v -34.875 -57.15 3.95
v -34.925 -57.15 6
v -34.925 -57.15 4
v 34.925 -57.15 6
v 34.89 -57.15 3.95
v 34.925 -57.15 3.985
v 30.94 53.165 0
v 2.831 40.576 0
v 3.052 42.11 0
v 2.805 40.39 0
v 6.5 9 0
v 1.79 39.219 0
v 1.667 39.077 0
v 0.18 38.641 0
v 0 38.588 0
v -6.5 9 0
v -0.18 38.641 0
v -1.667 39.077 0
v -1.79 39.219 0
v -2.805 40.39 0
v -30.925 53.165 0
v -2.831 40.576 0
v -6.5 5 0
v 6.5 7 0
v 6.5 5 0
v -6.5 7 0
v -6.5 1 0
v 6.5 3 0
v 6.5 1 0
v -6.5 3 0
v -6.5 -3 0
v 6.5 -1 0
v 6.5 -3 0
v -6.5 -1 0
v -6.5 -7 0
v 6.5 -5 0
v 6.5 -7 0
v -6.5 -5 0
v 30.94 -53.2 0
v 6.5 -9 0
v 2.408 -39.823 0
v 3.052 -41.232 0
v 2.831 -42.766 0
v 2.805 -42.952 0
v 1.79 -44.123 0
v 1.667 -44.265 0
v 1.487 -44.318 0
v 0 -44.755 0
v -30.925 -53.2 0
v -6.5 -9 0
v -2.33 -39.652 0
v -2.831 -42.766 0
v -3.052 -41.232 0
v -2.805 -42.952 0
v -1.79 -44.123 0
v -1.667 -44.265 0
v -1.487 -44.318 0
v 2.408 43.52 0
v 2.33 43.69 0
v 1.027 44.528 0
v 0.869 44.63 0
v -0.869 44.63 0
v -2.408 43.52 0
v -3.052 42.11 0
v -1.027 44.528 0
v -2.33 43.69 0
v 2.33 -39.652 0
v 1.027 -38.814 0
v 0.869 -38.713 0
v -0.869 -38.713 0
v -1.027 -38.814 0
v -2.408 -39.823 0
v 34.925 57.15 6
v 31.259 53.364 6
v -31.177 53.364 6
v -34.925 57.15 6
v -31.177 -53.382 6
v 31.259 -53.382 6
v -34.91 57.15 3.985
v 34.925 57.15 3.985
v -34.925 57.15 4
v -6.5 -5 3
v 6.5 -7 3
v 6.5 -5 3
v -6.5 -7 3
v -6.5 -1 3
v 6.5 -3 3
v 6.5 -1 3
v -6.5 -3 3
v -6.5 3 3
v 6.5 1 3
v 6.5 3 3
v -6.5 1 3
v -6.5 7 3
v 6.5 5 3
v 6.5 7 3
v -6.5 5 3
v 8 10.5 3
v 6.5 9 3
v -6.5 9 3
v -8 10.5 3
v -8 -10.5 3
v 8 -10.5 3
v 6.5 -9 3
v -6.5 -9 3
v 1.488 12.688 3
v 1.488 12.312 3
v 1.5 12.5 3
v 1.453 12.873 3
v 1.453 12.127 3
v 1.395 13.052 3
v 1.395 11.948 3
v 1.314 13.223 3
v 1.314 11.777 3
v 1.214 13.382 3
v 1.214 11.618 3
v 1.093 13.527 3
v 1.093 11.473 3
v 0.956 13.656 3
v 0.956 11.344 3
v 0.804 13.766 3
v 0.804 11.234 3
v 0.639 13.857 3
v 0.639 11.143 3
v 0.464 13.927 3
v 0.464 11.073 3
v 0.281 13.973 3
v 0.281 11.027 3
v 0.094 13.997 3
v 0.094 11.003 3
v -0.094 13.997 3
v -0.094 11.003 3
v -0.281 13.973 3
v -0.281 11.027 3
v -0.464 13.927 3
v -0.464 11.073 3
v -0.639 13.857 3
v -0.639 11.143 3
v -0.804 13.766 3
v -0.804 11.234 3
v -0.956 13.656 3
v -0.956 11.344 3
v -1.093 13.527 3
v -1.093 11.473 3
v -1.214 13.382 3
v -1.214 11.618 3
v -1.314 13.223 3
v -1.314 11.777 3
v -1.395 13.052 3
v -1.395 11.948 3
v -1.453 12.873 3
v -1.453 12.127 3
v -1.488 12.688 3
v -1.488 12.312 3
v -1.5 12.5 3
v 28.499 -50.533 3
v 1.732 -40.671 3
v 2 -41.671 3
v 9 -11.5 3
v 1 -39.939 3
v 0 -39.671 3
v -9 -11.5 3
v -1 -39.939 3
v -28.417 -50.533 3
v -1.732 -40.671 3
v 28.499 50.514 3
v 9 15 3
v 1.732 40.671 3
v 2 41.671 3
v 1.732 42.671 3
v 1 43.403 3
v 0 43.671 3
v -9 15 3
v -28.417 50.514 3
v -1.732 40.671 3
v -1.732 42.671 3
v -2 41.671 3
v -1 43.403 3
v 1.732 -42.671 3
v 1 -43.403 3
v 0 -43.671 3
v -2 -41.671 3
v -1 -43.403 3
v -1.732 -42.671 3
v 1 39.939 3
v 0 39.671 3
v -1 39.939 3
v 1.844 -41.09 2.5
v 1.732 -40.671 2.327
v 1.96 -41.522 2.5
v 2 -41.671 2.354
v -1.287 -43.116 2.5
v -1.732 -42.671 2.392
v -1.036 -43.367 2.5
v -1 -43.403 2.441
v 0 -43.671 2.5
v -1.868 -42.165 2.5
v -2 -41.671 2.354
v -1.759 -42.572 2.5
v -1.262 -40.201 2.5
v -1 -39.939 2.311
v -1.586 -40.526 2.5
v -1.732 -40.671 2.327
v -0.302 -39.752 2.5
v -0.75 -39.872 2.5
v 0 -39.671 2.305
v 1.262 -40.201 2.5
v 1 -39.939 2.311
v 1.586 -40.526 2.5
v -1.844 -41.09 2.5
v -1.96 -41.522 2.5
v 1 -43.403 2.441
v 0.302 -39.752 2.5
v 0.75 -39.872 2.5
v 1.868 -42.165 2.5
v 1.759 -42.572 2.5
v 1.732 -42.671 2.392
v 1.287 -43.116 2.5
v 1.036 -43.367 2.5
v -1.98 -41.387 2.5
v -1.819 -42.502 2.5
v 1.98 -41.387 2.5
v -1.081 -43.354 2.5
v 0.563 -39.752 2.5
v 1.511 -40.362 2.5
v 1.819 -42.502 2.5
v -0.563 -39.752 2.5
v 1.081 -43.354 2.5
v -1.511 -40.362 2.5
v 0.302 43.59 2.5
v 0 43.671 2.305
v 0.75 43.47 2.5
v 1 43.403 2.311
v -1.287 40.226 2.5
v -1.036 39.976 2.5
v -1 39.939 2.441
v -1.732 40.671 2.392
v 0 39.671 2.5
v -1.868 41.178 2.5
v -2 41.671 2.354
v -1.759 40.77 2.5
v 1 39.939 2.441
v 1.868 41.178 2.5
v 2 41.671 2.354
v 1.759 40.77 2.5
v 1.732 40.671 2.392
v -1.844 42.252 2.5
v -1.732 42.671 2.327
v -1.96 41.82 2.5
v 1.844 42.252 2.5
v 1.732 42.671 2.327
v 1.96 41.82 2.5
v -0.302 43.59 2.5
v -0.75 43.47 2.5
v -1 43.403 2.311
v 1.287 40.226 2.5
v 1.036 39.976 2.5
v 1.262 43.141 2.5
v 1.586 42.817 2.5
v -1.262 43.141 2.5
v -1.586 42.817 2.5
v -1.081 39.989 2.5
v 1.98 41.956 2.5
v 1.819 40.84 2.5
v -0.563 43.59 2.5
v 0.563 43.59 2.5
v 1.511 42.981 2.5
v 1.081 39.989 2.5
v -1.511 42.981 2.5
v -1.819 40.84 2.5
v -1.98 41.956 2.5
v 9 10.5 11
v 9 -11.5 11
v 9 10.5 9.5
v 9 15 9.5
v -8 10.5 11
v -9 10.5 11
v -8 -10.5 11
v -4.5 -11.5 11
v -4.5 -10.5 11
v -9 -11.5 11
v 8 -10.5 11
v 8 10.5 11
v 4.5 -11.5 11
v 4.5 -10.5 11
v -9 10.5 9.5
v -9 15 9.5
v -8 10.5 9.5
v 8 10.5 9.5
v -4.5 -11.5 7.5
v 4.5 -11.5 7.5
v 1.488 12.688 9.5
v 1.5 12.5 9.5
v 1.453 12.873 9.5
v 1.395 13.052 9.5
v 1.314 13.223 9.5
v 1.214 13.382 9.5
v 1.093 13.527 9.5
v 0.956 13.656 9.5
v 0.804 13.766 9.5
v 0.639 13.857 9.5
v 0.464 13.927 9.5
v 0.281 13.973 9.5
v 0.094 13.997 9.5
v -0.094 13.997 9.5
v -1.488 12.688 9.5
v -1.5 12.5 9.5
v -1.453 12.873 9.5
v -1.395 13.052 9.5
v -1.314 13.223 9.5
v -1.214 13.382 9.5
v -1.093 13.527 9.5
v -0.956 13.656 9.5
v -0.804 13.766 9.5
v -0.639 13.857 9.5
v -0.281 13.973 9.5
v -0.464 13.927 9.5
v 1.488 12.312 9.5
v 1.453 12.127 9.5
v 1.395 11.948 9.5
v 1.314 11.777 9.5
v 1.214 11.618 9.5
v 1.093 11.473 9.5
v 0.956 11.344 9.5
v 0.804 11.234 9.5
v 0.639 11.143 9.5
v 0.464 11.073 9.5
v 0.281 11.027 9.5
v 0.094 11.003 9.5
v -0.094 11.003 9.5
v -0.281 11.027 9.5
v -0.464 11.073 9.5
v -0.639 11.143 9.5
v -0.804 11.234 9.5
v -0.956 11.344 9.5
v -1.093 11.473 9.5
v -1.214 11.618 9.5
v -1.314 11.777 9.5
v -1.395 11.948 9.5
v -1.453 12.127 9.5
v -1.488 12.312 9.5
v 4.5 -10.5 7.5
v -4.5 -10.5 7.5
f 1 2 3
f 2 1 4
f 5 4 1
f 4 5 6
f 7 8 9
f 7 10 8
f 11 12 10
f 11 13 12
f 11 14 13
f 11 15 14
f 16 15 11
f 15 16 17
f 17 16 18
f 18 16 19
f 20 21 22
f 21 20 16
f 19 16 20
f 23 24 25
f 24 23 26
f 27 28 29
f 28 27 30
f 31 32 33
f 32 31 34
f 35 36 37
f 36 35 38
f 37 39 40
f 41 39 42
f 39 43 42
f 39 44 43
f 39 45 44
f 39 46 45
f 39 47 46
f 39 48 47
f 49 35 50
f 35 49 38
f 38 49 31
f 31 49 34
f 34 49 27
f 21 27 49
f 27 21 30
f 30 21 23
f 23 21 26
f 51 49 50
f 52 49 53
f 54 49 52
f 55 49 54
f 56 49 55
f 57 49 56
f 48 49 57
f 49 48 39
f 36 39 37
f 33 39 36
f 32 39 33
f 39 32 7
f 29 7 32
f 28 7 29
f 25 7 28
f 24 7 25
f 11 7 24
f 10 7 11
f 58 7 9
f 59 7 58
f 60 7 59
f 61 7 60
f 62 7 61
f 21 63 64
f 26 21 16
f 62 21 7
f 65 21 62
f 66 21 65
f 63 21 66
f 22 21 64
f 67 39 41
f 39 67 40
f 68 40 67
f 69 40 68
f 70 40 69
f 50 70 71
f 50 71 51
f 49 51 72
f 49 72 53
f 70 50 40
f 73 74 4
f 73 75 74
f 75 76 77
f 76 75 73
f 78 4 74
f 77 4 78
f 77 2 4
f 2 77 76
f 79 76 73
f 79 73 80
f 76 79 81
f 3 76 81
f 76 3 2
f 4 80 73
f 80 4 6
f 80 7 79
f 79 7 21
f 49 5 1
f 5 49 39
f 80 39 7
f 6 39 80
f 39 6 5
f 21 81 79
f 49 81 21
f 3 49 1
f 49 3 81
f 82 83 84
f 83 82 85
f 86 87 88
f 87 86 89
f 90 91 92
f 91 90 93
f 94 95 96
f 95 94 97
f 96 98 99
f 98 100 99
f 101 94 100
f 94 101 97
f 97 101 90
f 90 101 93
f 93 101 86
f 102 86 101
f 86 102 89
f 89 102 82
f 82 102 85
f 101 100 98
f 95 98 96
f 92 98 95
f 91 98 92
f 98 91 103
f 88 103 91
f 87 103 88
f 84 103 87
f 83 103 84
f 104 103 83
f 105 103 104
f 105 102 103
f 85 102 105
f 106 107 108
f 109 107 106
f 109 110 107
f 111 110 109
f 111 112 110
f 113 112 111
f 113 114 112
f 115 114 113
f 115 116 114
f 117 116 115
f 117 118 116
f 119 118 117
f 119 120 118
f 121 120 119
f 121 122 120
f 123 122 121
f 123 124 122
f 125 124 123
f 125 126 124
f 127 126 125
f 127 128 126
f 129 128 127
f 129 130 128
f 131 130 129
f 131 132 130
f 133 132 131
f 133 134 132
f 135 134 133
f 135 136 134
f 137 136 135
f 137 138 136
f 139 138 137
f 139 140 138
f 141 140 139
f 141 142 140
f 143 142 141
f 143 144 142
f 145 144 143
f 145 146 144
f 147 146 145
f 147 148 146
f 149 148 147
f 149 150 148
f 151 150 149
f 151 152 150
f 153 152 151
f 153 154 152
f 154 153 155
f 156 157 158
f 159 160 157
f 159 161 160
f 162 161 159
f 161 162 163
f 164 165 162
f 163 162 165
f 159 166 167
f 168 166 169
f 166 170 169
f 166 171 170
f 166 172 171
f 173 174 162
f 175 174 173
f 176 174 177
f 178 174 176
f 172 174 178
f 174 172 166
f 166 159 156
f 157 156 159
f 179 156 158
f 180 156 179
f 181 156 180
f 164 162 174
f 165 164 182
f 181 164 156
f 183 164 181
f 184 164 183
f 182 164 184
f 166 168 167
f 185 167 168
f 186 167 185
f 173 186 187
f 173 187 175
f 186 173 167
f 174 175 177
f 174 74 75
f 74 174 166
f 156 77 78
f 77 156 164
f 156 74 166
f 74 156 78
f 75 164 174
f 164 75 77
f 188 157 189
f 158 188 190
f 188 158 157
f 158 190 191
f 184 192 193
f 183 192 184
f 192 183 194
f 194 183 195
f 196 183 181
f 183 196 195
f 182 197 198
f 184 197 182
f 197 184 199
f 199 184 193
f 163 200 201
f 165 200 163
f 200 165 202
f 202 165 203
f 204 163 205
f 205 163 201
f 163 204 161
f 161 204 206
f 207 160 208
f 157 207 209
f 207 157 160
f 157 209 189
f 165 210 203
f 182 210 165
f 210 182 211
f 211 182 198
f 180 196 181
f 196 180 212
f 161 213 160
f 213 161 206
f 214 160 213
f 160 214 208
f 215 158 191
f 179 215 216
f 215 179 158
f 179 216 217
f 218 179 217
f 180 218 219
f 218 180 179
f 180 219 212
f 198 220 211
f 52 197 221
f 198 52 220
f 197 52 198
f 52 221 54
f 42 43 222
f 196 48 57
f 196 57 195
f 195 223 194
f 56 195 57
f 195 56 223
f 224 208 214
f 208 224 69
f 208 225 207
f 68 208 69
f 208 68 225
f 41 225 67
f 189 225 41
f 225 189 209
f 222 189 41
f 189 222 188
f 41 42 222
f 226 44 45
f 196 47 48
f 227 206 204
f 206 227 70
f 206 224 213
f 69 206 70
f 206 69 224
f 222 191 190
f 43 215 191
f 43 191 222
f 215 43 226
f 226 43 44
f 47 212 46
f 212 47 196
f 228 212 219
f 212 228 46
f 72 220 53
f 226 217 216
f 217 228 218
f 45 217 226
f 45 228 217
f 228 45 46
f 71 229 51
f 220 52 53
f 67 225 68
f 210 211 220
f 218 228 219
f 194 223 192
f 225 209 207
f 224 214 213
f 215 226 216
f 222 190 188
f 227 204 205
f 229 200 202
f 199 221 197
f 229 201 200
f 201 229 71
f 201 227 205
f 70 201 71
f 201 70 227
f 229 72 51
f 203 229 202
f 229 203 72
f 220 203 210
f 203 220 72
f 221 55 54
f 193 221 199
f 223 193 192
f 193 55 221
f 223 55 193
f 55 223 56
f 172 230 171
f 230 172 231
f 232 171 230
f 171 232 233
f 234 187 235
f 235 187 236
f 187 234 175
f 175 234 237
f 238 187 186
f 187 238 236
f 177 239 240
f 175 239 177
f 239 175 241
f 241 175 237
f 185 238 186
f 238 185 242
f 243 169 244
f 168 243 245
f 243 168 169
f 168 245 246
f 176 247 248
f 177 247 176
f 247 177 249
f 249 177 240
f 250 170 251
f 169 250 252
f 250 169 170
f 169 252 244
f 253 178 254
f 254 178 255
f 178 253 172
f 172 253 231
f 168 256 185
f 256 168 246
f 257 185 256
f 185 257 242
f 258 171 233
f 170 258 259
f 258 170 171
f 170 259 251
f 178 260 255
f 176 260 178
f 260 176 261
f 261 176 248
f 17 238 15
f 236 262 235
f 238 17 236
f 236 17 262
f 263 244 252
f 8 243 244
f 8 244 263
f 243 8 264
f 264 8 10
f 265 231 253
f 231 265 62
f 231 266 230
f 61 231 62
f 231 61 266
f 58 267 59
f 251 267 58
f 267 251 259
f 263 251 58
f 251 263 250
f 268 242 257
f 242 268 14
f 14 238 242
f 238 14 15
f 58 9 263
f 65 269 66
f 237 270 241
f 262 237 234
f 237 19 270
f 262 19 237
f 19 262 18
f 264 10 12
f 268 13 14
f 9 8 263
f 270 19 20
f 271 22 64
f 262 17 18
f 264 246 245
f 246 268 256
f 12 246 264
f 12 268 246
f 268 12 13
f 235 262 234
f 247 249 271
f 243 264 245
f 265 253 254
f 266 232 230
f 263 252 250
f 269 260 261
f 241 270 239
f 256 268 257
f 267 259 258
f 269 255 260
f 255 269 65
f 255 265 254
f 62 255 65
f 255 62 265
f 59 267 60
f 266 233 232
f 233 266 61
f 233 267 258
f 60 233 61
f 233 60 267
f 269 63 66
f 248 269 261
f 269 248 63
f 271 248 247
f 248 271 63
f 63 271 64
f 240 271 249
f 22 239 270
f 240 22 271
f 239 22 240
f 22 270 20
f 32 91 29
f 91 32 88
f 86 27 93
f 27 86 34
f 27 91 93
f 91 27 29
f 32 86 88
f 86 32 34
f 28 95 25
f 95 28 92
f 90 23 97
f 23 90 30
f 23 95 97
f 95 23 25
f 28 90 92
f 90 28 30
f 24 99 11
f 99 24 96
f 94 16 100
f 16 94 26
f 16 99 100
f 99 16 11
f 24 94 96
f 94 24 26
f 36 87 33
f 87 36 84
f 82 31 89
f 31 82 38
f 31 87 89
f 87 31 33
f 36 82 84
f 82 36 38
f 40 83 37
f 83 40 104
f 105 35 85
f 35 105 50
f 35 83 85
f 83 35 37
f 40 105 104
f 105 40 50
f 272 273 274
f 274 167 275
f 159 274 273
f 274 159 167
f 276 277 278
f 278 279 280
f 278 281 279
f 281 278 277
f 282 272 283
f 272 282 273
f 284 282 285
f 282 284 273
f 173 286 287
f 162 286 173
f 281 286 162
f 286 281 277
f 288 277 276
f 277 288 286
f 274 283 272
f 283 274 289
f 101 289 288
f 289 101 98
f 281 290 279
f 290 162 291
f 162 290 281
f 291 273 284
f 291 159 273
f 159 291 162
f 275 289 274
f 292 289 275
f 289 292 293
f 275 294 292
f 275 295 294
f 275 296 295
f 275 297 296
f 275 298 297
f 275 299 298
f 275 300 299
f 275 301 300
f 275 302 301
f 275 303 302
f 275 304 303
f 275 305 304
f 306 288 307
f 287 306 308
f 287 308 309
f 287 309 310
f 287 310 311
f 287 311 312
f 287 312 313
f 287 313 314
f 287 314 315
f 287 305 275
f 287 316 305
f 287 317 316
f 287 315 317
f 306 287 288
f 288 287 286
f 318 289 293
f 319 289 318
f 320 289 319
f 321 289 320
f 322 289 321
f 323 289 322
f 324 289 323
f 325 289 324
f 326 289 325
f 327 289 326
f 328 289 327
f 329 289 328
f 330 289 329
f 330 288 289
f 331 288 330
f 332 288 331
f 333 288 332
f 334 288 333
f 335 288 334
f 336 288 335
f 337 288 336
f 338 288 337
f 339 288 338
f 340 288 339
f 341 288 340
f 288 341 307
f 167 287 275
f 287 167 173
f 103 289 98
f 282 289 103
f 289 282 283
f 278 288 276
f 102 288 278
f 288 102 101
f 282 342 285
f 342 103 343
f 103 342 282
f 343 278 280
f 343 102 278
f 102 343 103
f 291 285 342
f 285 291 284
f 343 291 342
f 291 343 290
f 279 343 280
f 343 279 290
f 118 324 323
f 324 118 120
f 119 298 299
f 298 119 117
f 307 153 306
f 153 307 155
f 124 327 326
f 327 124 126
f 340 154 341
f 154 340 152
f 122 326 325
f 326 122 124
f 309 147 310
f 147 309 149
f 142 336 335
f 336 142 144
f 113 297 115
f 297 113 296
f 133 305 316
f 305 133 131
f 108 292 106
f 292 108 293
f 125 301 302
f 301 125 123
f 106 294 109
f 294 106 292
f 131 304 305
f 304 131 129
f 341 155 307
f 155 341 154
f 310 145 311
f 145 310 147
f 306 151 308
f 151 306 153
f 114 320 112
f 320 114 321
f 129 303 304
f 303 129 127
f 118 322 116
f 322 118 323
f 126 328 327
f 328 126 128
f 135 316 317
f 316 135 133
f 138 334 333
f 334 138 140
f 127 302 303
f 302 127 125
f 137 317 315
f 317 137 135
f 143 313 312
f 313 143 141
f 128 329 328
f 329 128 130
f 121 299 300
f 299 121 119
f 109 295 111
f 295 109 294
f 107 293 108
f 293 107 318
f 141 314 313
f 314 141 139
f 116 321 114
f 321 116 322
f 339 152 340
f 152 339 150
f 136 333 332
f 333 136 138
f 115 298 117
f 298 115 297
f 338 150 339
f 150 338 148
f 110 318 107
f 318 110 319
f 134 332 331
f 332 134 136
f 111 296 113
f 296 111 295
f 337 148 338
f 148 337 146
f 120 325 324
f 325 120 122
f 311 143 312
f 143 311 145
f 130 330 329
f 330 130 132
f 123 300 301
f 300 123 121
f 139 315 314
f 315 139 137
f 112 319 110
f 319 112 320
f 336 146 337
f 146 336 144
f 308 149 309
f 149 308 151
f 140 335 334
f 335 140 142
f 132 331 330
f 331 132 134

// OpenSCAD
// file: screenModules.scad
module corner(r){
  difference(){
    square(r);
    translate([r,r,0]) circle(r=r);
  }
}

module screen(){
  displayCorner = 8;
  displayHeight = 106;
  displayWidth = 187.5;
  difference(){
    square([displayWidth,displayHeight]);
    corner(displayCorner);
    translate([displayWidth,0,0]) rotate([0,0,90]) corner(displayCorner);
    translate([displayWidth,displayHeight,0]) rotate([0,0,180]) corner(displayCorner);
    translate([0,displayHeight,0]) rotate([0,0,270]) corner(displayCorner);
  }
}

module screen_border(){
  displayCorner = 8;
  displayHeight = 106.25;
  displayWidth = 187.75;
  difference(){
    square([displayWidth+5,displayHeight+5]);
    corner(displayCorner);
    translate([displayWidth+5,0,0]) rotate([0,0,90]) corner(displayCorner);
    translate([displayWidth+5,displayHeight+5,0]) rotate([0,0,180]) corner(displayCorner);
    translate([0,displayHeight+5,0]) rotate([0,0,270]) corner(displayCorner);
  }
}

module screen_border_2(){
  displayCorner = 10;
  displayHeight = 110.25;
  displayWidth = 191.75;
  difference(){
    square([displayWidth+5,displayHeight+5]);
    corner(displayCorner);
    translate([displayWidth+5,0,0]) rotate([0,0,90]) corner(displayCorner);
    translate([displayWidth+5,displayHeight+5,0]) rotate([0,0,180]) corner(displayCorner);
    translate([0,displayHeight+5,0]) rotate([0,0,270]) corner(displayCorner);
  }
}

module raspberrypi_holes() {
    x = 56;
    r = 2.5/2;
    translate([3.5, 3.5])            post(r,3);
    translate([(x - 3.5), 3.5])      post(r,3);
    translate([3.5, 3.5 + 58])       post(r,3);
    translate([(x - 3.5), 3.5 + 58]) post(r,3);
}

module raspberrypi_screws() {
    x = 56;
    r = 2.5/2;
    translate([3.5, 3.5])            circle(r=r,$fn=50);
    translate([(x - 3.5), 3.5])      circle(r=r,$fn=50);
    translate([3.5, 3.5 + 58])       circle(r=r,$fn=50);
    translate([(x - 3.5), 3.5 + 58]) circle(r=r,$fn=50);
}

module post(r1,r2){
	translate([r2,r2,0]) difference(){
		circle(r=r2,$fn=50);
		circle(r=r1,$fn=50);
	}
}

module screen_holes(){
	W = 126;
	H = 65.5;
	r = 2;
	translate([0,0,0]) translate([r,r,0]) circle(r=r,$fn=50);
	translate([W,0,0]) translate([r,r,0]) circle(r=r,$fn=50);
	translate([0,H,0]) translate([r,r,0]) circle(r=r,$fn=50);
	translate([W,H,0]) translate([r,r,0]) circle(r=r,$fn=50);
}

module screen_hole(r){
	W = 126;
	H = 65.5;
	translate([0,0,0]) translate([r,r,0]) circle(r=r,$fn=50);
	translate([W,0,0]) translate([r,r,0]) circle(r=r,$fn=50);
	translate([0,H,0]) translate([r,r,0]) circle(r=r,$fn=50);
	translate([W,H,0]) translate([r,r,0]) circle(r=r,$fn=50);
}

module cap_holes(){
	W = 46.5;
	H = 24;
	r = 1.5;
	translate([0,0,0]) translate([r,r,0]) circle(r=r,$fn=50);
	translate([W,1,0]) translate([r,r,0]) circle(r=r,$fn=50);
	translate([0,H,0]) translate([r,r,0]) circle(r=r,$fn=50);
	translate([W,H-1,0]) translate([r,r,0]) circle(r=r,$fn=50);
}

module cap_posts(){
	W = 46.5;
	H = 24;
	r = 1.5;
	translate([0,0,0]) post(1.5,3);
	translate([W,1,0]) post(1.5,3);
	translate([0,H,0]) post(1.5,3);
	translate([W,H-1,0]) post(1.5,3);
}

module screen_frame(){
	difference(){
		AnchorL = 32.5;
		AnchorB = 22;
		displayDepth = 8.5;
		linear_extrude(height=displayDepth+1.4) screen_border();
		translate([2.5,2.5,1.5]) linear_extrude(height=displayDepth) screen();
		translate([50,17,-1]) cube([90,80,displayDepth]);
		linear_extrude(height=displayDepth+3) translate([AnchorL,AnchorB,0]) screen_holes();
	}
}

module carrier_spacer(){
	AnchorB = 22;
	linear_extrude(height=8) difference(){
		square([153,105]);
		translate([28,17]) square([90,80]);
		translate([10,AnchorB,0]) screen_holes();
	}
}

module carrier_board(){
	AnchorB = 22;
	color("DarkOrange") linear_extrude(height=1) difference(){
		square([153,105]);
		translate([10,AnchorB,0]) screen_holes();
		translate([30,50]) square([10,20]);
	}
	translate([130,40,0]) rotate([0,0,90]) color("RoyalBlue") linear_extrude(height=6) raspberrypi_holes();
	translate([146,17,0]) rotate([0,0,-90]) color("Lime") m2();
	translate([3,50,1]) rotate([0,0,-90]) usbc();
	translate([3,83,1]) rotate([0,0,-90]) hdmiHolder();
}

module carrier_wall(){
	difference(){
		W = 153;
		H = 105;
		D = 30;
		Wall = 3;
		cube([W,H,D]);
		translate([Wall,Wall,0]) cube([W-(Wall*2),H-(Wall*2),D+1]);
		HDMI1T = 25;
		HDMI1H = 18;
		HDMI1D = 8;
		HDMI1B = 6;
		#translate([0,H-(HDMI1T+HDMI1H),HDMI1B]) cube([Wall,HDMI1H,HDMI1D]);
		HDMI2T = 64;
		HDMI2H = 18;
		HDMI2B = 10;
		#translate([3,H-(HDMI2T+HDMI2H),HDMI2B]) rotate([0,0,90]) hdmiPlate();
		USBT = 36;
		USBH = 10;
		USBD = 4;
		USBB = 4.5;
		#translate([0,(USBT),USBB]) cube([Wall,USBH,USBD]);
		ETHT = 33+35+10;
		ETHB = 6;
		ETHW = 20;
		ETHH = 16;
		#translate([W-Wall,(ETHT),ETHB]) cube([Wall,ETHW,ETHH]);
	}
}

module m2(){
	difference(){
		union(){
			linear_extrude(height=3) circle(r=3,$fn=20);
			linear_extrude(height=4) translate([-13.5,-78.5,0]) difference(){
				square([27,81]);
				translate([2,2,0]) square([23,76.5]);
			}
			translate([-13.5,-78.5,0]) cube([27,2,5]);
		}
		linear_extrude(height=4) circle(r=1.5,$fn=20);
		translate([-10,-78.5,3]) cube([20,2.25,1]);
	}
}

module usbc(){
	usbH=4;
	usbW=10;
	usbD=12.25;
	boardD=15;
	boardW=16;
	boardH=1;
	height=6;
	union(){
		difference(){
			union(){
				cube([boardW+2,boardD+1,height]);
				translate([boardW+1+1.85,7+2.5,0]) cylinder(r=2.5,h=height,$fn=20);
				translate([0-.85,7+2.5,0]) cylinder(r=2.5,h=height,$fn=20);
			}
			translate([boardW+1+1.85,7+2.5,0]) cylinder(r=1.5,h=height,$fn=20);
			translate([boardW,8,height-boardH]) cube([3,3,boardH]);
			translate([-.85,7+2.5,0]) cylinder(r=1.5,h=height,$fn=20);
			translate([-.85,8,height-boardH]) cube([3,3,boardH]);
			translate([1,-1,height-boardH]) cube([boardW,boardD+1,boardH]);
			#translate([((boardW+2)/2)-(usbW/2),-1,(height-(usbH/2))-(boardH/2)]) cube([usbW,usbD+1,usbH]);
			translate([(18-usbW)/2,boardD+1-3,height-boardH-1.5]) cube([usbW,3,2.5]);
		}
	}
}

module hdmiHolder(){
	boardD=22;
	boardW=22;
	boardH=1.5;
	hdmiD=12;
	hdmiH=6;
	hdmiW=15.5;
	height=6;
	union(){
		difference(){
			union(){
				cube([boardW+2,boardD+1,height]);
				translate([boardW+1+1.85,10+2.5,0]) cylinder(r=2.5,h=height,$fn=20);
				translate([0-.85,10+2.5,0]) cylinder(r=2.5,h=height,$fn=20);
			}
			translate([boardW+1+1.85,10+2.5,0]) cylinder(r=1.5,h=height,$fn=20);
			translate([boardW,11,height-boardH]) cube([3,3,boardH]);
			translate([-.85,10+2.5,0]) cylinder(r=1.5,h=height,$fn=20);
			translate([-.85,11,height-boardH]) cube([3,3,boardH]);
			translate([1,-1,height-boardH]) cube([boardW,boardD+1,boardH]);
			#translate([((boardW+2)/2)-(hdmiW/2),-1,height]) cube([hdmiW,hdmiD+1,hdmiH]);
		}
	}
}

module hdmiPlate(){
	outerW = 36.25;
	outerH = 12.5;
	innerW = 17.25;
	innerH = 8;
	screwD = 3.25;
	screwW = 27;
	cube([outerW,2,outerH]);
	translate([(outerW-innerW)/2,2,(outerH-innerH)/2]) cube([innerW,2,innerH]);
	#translate([(outerW-screwW)/2,0,(outerH/2)]) rotate([-90,0,0]) cylinder(h=5,r=screwD/2,$fn=20);
	#translate([outerW-((outerW-screwW)/2),0,(outerH/2)]) rotate([-90,0,0]) cylinder(h=5,r=screwD/2,$fn=20);
}

module DHT22_holder(){
	width=16;
	height=21;
	depth=8;
	tabHole=1;
	difference(){
		union(){
			cube([width+2,height+1,depth]);
			translate([0,height,0]) cube([width+2,5.5,6.5]);
		}
		translate([1,1,0]) cube([width,height,depth]);
		#translate([(width/2)-3.5,0,4.5]) cube([9,1,5.5]);
		translate([(width+2)/2,height+1+tabHole+1,0]) cylinder(r=1.5,h=6.5,$fn=50);
	}
}

module wall_plate_holes(r){
	distance = 84;
	circle(r=r,$fn=50);
	translate([0,distance,0]) circle(r=r,$fn=50);
}
// main file
include <screenModules.scad>;
// WALLY - Wall Plate Customizer v1.3
// by TheNewHobbyist 2013 (http://thenewhobbyist.com)
// http://www.thingiverse.com/thing:47956
//
// Most of the connectors used with this thing are panel mount connectors from
// www.DataPro.net I can't vouch for their quality but they did have easy to
// find dimensions for their products so I used them.
//
// This could be tightened up considerably but I thought I'd get it out there for people
// to experiment with before I lose my mind staring at it too long. Also this is my
// first OpenSCAD model so cut me some slack ;)
//
//   Notes:
//
// * The plug types "Duplex Outlet", "Long_Toggle Switch", "Toggle Switch", and "Rocker"
//   will all use the entire plate when selected in top or bottom configuration. The
//   other selection (if not "none" will be selected.
//
// * "None" and "Blank should not be considered equal. if "None" is selected for one of
//   the two holes on a plate the other selection will be centered on that plate. If
//   "Blank" is selected that plug location will remain blank but the other selection
//   will NOT move into a centered position.
//
//	Change Log:
//
//	v1.1
//	UPDATED: Screw hole locations for designer and toggle plate types.
//	UPDATED: Hole size for designer plate type.
//	UPDATED: Outlet hole spacing
//
//	v1.2
//	ADDED: Long Toggle Switch for laird
//
//	v1.3
//	ADDED: 3 new sizes for plate export: Standard, Junior-Jumbo, and Jumbo.
//

  //////////////////////////
 // Customizer Settings: //
//////////////////////////

//How big are we talkin' here?
plate_width = 1; //	[1:5]

// Bigger hole in your wall? Try this
plate_size = 0; // [0:Standard, 1:Junior-Jumbo, 2:Jumbo]

//Pick a plug or full plate type
1st_plate = "none";  //	["none":None, "blank":Blank Port, "toggle":Full Plate - Toggle Switch, "long_toggle":Full Plate - Long Toggle Switch, "outlet":Full Plate - Duplex Outlet, "rocker":Full Plate - Rocker/Designer Plate, "keystone1":Keystone Jack, "vga":VGA Port, "hdmi":HDMI Port, "dvi":DVI-I Port, "displayport":Displayport, "cat5e":Cat5e/Cat6 Port, "usb-a":USB-A Port, "usb-b":USB-B Port, "firewire":Firewire IEEE 1394 Port, "db09":DB-09 Port, "ps2":PS2 Port, "f-type": F-Type/Coaxial Port,"svideo":S-Video Port, "stereo":Stereo Headphone Jack]
//Pick a bottom plug type or leave as none
1st_plate_bottom_hole = "none";  //	["none":None, "blank":Blank Port, "keystone1":Keystone Jack, "vga":VGA Port, "hdmi":HDMI Port, "dvi":DVI-I Port, "displayport":Displayport, "cat5e":Cat5e/Cat6 Port, "usb-a":USB-A Port, "usb-b":USB-B Port, "firewire":Firewire IEEE 1394 Port, "db09":DB-09 Port, "ps2":PS2 Port, "f-type": F-Type/Coaxial Port,"svideo":S-Video Port, "stereo":Stereo Headphone Jack]
//Pick a plug or full plate type
2nd_plate = "none";  //	["none":None, "blank":Blank Port, "toggle":Full Plate - Toggle Switch, "long_toggle":Full Plate - Long Toggle Switch, "outlet":Full Plate - Duplex Outlet, "rocker":Full Plate - Rocker/Designer Plate, "keystone1":Keystone Jack, "vga":VGA Port, "hdmi":HDMI Port, "dvi":DVI-I Port, "displayport":Displayport, "cat5e":Cat5e/Cat6 Port, "usb-a":USB-A Port, "usb-b":USB-B Port, "firewire":Firewire IEEE 1394 Port, "db09":DB-09 Port, "ps2":PS2 Port, "f-type": F-Type/Coaxial Port,"svideo":S-Video Port, "stereo":Stereo Headphone Jack]
//Pick a bottom plug type or leave as none
2nd_plate_bottom_hole = "none";  //	["none":None, "blank":Blank Port, "keystone1":Keystone Jack, "vga":VGA Port, "hdmi":HDMI Port, "dvi":DVI-I Port, "displayport":Displayport, "cat5e":Cat5e/Cat6 Port, "usb-a":USB-A Port, "usb-b":USB-B Port, "firewire":Firewire IEEE 1394 Port, "db09":DB-09 Port, "ps2":PS2 Port, "f-type": F-Type/Coaxial Port,"svideo":S-Video Port, "stereo":Stereo Headphone Jack]
//Pick a plug or full plate type
3rd_plate = "none";  //	["none":None, "blank":Blank Port, "toggle":Full Plate - Toggle Switch, "long_toggle":Full Plate - Long Toggle Switch, "outlet":Full Plate - Duplex Outlet, "rocker":Full Plate - Rocker/Designer Plate, "keystone1":Keystone Jack, "vga":VGA Port, "hdmi":HDMI Port, "dvi":DVI-I Port, "displayport":Displayport, "cat5e":Cat5e/Cat6 Port, "usb-a":USB-A Port, "usb-b":USB-B Port, "firewire":Firewire IEEE 1394 Port, "db09":DB-09 Port, "ps2":PS2 Port, "f-type": F-Type/Coaxial Port,"svideo":S-Video Port, "stereo":Stereo Headphone Jack]
//Pick a bottom plug type or leave as none
3rd_plate_bottom_hole = "none";  //	["none":None, "blank":Blank Port, "keystone1":Keystone Jack, "vga":VGA Port, "hdmi":HDMI Port, "dvi":DVI-I Port, "displayport":Displayport, "cat5e":Cat5e/Cat6 Port, "usb-a":USB-A Port, "usb-b":USB-B Port, "firewire":Firewire IEEE 1394 Port, "db09":DB-09 Port, "ps2":PS2 Port, "f-type": F-Type/Coaxial Port,"svideo":S-Video Port, "stereo":Stereo Headphone Jack]
//Pick a plug or full plate type
4th_plate = "none";  //["none":None, "blank":Blank Port, "toggle":Full Plate - Toggle Switch, "long_toggle":Full Plate - Long Toggle Switch, "outlet":Full Plate - Duplex Outlet, "rocker":Full Plate - Rocker/Designer Plate, "keystone1":Keystone Jack, "vga":VGA Port, "hdmi":HDMI Port, "dvi":DVI-I Port, "displayport":Displayport, "cat5e":Cat5e/Cat6 Port, "usb-a":USB-A Port, "usb-b":USB-B Port, "firewire":Firewire IEEE 1394 Port, "db09":DB-09 Port, "ps2":PS2 Port, "f-type": F-Type/Coaxial Port,"svideo":S-Video Port, "stereo":Stereo Headphone Jack]
//Pick a bottom plug type or leave as none
4th_plate_bottom_hole = "none";  //	["none":None, "blank":Blank Port, "keystone1":Keystone Jack, "vga":VGA Port, "hdmi":HDMI Port, "dvi":DVI-I Port, "displayport":Displayport, "cat5e":Cat5e/Cat6 Port, "usb-a":USB-A Port, "usb-b":USB-B Port, "firewire":Firewire IEEE 1394 Port, "db09":DB-09 Port, "ps2":PS2 Port, "f-type": F-Type/Coaxial Port,"svideo":S-Video Port, "stereo":Stereo Headphone Jack]
//Pick a plug or full plate type
5th_plate = "none";  //["none":None, "blank":Blank Port, "toggle":Full Plate - Toggle Switch, "long_toggle":Full Plate - Long Toggle Switch, "outlet":Full Plate - Duplex Outlet, "rocker":Full Plate - Rocker/Designer Plate, "keystone1":Keystone Jack, "vga":VGA Port, "hdmi":HDMI Port, "dvi":DVI-I Port, "displayport":Displayport, "cat5e":Cat5e/Cat6 Port, "usb-a":USB-A Port, "usb-b":USB-B Port, "firewire":Firewire IEEE 1394 Port, "db09":DB-09 Port, "ps2":PS2 Port, "f-type": F-Type/Coaxial Port,"svideo":S-Video Port, "stereo":Stereo Headphone Jack]
//Pick a bottom plug type or leave as none
5th_plate_bottom_hole = "none";  //	["none":None, "blank":Blank Port, "keystone1":Keystone Jack, "vga":VGA Port, "hdmi":HDMI Port, "dvi":DVI-I Port, "displayport":Displayport, "cat5e":Cat5e/Cat6 Port, "usb-a":USB-A Port, "usb-b":USB-B Port, "firewire":Firewire IEEE 1394 Port, "db09":DB-09 Port, "ps2":PS2 Port, "f-type": F-Type/Coaxial Port,"svideo":S-Video Port, "stereo":Stereo Headphone Jack]

  //////////////////////
 // Static Settings: //
//////////////////////

module GoAwayCustomizer() {
// This module is here to stop Customizer from picking up the variables below
}

l_offset = [34.925,39.6875,44.45];
r_offset = [34.925,39.6875,44.45];
spacer = [0,0,46.0375,92.075,138.1125,184.15];
solid_plate_width = l_offset[plate_size] + spacer[plate_width] + r_offset[plate_size];

height_sizes = [114.3,123.825,133.35];

height = 114.3; //plate height (static)
gang_width=[0,69.86,115.824,161.925,206.375,254]; // Plate widths (standard)

edgewidth = solid_plate_width + 10; // Bevel setting for top and bottom
rightbevel = solid_plate_width - 4; // Bevel for right side (scales)

left_offset = 34.925; // Offset first hole position
switch_offset = 46.0375; // Offset all additional holes
thinner_offset=[0,0.92,0.95,0.96,0.97,0.973]; // Manual fix for right side wackiness

positions=[height_sizes[plate_size]/2,height_sizes[plate_size]/2 - 14.25,height_sizes[plate_size]/2 + 14.25];

// preview[view:north, tilt:bottom]

  ///////////////////
 // Hole Control: //
///////////////////

module plate1(){
	if (1st_plate == "toggle" || 1st_plate_bottom_hole == "toggle"){
		translate([0,l_offset[plate_size],0]) toggle_screws();
		translate([0,l_offset[plate_size],0]) hole("toggle");
		}
	else if (1st_plate == "long_toggle" || 1st_plate_bottom_hole == "long_toggle"){
		translate([0,l_offset[plate_size],0]) toggle_screws();
		translate([0,l_offset[plate_size],0]) hole("long_toggle");
		}
	else if (1st_plate == "rocker" || 1st_plate_bottom_hole == "rocker"){
		translate([0,l_offset[plate_size],0]) rocker_screws();
		translate([0,l_offset[plate_size],0]) hole("rocker");
		}
	else if (1st_plate == "outlet" || 1st_plate_bottom_hole == "outlet") {
	translate([0,l_offset[plate_size],0]) hole("outlet");
	}
	else if (1st_plate_bottom_hole == "none") {
		translate([0,l_offset[plate_size],0]) box_screws();
		translate([positions[0],l_offset[plate_size],0]) hole(1st_plate);
			}
	else if (1st_plate == "none") {
		translate([0,l_offset[plate_size],0]) box_screws();
		translate([positions[0],l_offset[plate_size],0]) hole(1st_plate_bottom_hole);
			}
	else {
	translate([0,l_offset[plate_size],0]) box_screws();
	translate([positions[1],l_offset[plate_size],0]) hole(1st_plate);
	translate([positions[2],l_offset[plate_size],0]) hole(1st_plate_bottom_hole);
	}
}

module plate2(){
	if (2nd_plate == "toggle" || 2nd_plate_bottom_hole == "toggle"){
		translate([0,l_offset[plate_size] + switch_offset,0]) toggle_screws();
		translate([0,l_offset[plate_size] + switch_offset,0]) hole("toggle");
		}
	else if (2nd_plate == "long_toggle" || 2nd_plate_bottom_hole == "long_toggle"){
		translate([0,l_offset[plate_size] + switch_offset,0]) toggle_screws();
		translate([0,l_offset[plate_size] + switch_offset,0]) hole("long_toggle");
		}
	else if (2nd_plate == "rocker" || 2nd_plate_bottom_hole == "rocker"){
		translate([0,l_offset[plate_size] + switch_offset,0]) rocker_screws();
		translate([0,l_offset[plate_size] + switch_offset,0]) hole("rocker");
		}
	else if (2nd_plate == "outlet" || 2nd_plate_bottom_hole == "outlet") {
	translate([0,l_offset[plate_size] + switch_offset,0]) hole("outlet");
	}
	else if (2nd_plate_bottom_hole == "none") {
		translate([0,l_offset[plate_size] + switch_offset,0]) box_screws();
		translate([positions[0],l_offset[plate_size] + switch_offset,0]) hole(2nd_plate);
			}
	else if (2nd_plate == "none") {
		translate([0,l_offset[plate_size] + switch_offset,0]) box_screws();
		translate([positions[0],l_offset[plate_size] + switch_offset,0]) hole(2nd_plate_bottom_hole);
			}
	else {
	translate([0,l_offset[plate_size] + switch_offset,0]) box_screws();
	translate([positions[1],l_offset[plate_size] + switch_offset,0]) hole(2nd_plate);
	translate([positions[2],l_offset[plate_size] + switch_offset,0]) hole(2nd_plate_bottom_hole);
	}
}

module plate3(){
	if (3rd_plate == "toggle" || 3rd_plate_bottom_hole == "toggle"){
		translate([0,l_offset[plate_size] + switch_offset * 2,0]) toggle_screws();
		translate([0,l_offset[plate_size] + switch_offset * 2,0]) hole("toggle");
		}
	else if (3rd_plate == "long_toggle" || 3rd_plate_bottom_hole == "long_toggle"){
		translate([0,l_offset[plate_size] + switch_offset * 2,0]) toggle_screws();
		translate([0,l_offset[plate_size] + switch_offset * 2,0]) hole("long_toggle");
		}
	else if (3rd_plate == "rocker" || 3rd_plate_bottom_hole == "rocker"){
		translate([0,l_offset[plate_size] + switch_offset * 2,0]) rocker_screws();
		translate([0,l_offset[plate_size] + switch_offset * 2,0]) hole("rocker");
		}
	else if (3rd_plate == "outlet" || 3rd_plate_bottom_hole == "outlet") {
	translate([0,l_offset[plate_size] + switch_offset * 2,0]) hole("outlet");
	}
	else if (3rd_plate_bottom_hole == "none") {
		translate([0,l_offset[plate_size] + switch_offset * 2,0]) box_screws();
		translate([positions[0],l_offset[plate_size] + switch_offset * 2,0]) hole(3rd_plate);
			}
	else if (3rd_plate == "none") {
		translate([0,l_offset[plate_size] + switch_offset * 2,0]) box_screws();
		translate([positions[0],l_offset[plate_size] + switch_offset * 2,0]) hole(3rd_plate_bottom_hole);
			}
	else {
	translate([0,l_offset[plate_size] + switch_offset * 2,0]) box_screws();
	translate([positions[1],l_offset[plate_size] + switch_offset * 2,0]) hole(3rd_plate);
	translate([positions[2],l_offset[plate_size] + switch_offset * 2,0]) hole(3rd_plate_bottom_hole);
	}
}

module plate4(){
	if (4th_plate == "toggle" || 4th_plate_bottom_hole == "toggle"){
		translate([0,l_offset[plate_size] + switch_offset * 3,0]) toggle_screws();
		translate([0,l_offset[plate_size] + switch_offset * 3,0]) hole("toggle");
		}
	else if (4th_plate == "long_toggle" || 4th_plate_bottom_hole == "long_toggle"){
		translate([0,l_offset[plate_size] + switch_offset * 3,0]) toggle_screws();
		translate([0,l_offset[plate_size] + switch_offset * 3,0]) hole("long_toggle");
		}
	else if (4th_plate == "rocker" || 4th_plate_bottom_hole == "rocker"){
		translate([0,l_offset[plate_size] + switch_offset * 3,0]) rocker_screws();
		translate([0,l_offset[plate_size] + switch_offset * 3,0]) hole("rocker");
		}
	else if (4th_plate == "outlet" || 4th_plate_bottom_hole == "outlet") {
	translate([0,l_offset[plate_size] + switch_offset * 3,0]) hole("outlet");
	}
	else if (4th_plate_bottom_hole == "none") {
		translate([0,l_offset[plate_size] + switch_offset * 3,0]) box_screws();
		translate([positions[0],l_offset[plate_size] + switch_offset * 3,0]) hole(4th_plate);
			}
	else if (4th_plate == "none") {
		translate([0,l_offset[plate_size] + switch_offset * 3,0]) box_screws();
		translate([positions[0],l_offset[plate_size] + switch_offset * 3,0]) hole(4th_plate_bottom_hole);
			}
	else {
	translate([0,l_offset[plate_size] + switch_offset * 3,0]) box_screws();
	translate([positions[1],l_offset[plate_size] + switch_offset * 3,0]) hole(4th_plate);
	translate([positions[2],l_offset[plate_size] + switch_offset * 3,0]) hole(4th_plate_bottom_hole);
	}
}

module plate5(){
	if (5th_plate == "toggle" || 5th_plate_bottom_hole == "toggle"){
		translate([0,l_offset[plate_size] + switch_offset * 4,0]) toggle_screws();
		translate([0,l_offset[plate_size] + switch_offset * 4,0]) hole("toggle");
		}
	else if (5th_plate == "long_toggle" || 5th_plate_bottom_hole == "long_toggle"){
		translate([0,l_offset[plate_size] + switch_offset * 4,0]) toggle_screws();
		translate([0,l_offset[plate_size] + switch_offset * 4,0]) hole("long_toggle");
		}
	else if (5th_plate == "rocker" || 5th_plate_bottom_hole == "rocker"){
		translate([0,l_offset[plate_size] + switch_offset * 4,0]) rocker_screws();
		translate([0,l_offset[plate_size] + switch_offset * 4,0]) hole("rocker");
		}
	else if (5th_plate == "outlet" || 5th_plate_bottom_hole == "outlet") {
	translate([0,l_offset[plate_size] + switch_offset * 4,0]) hole("outlet");
	}
	else if (5th_plate_bottom_hole == "none") {
		translate([0,l_offset[plate_size] + switch_offset * 4,0]) box_screws();
		translate([positions[0],l_offset[plate_size] + switch_offset * 4,0]) hole(5th_plate);
			}
	else if (5th_plate == "none") {
		translate([0,l_offset[plate_size] + switch_offset * 4,0]) box_screws();
		translate([positions[0],l_offset[plate_size] + switch_offset * 4,0]) hole(5th_plate_bottom_hole);
			}
	else {
	translate([0,l_offset[plate_size] + switch_offset * 4,0]) box_screws();
	translate([positions[1],l_offset[plate_size] + switch_offset * 4,0]) hole(5th_plate);
	translate([positions[2],l_offset[plate_size] + switch_offset * 4,0]) hole(5th_plate_bottom_hole);
	}
}

  /////////////////
 // SolidWorks: //
/////////////////

module plate1_solid(){
if (1st_plate == "keystone1" && 1st_plate_bottom_hole == "none") {
	translate([height_sizes[plate_size]/2 + 14.3,l_offset[plate_size] - 11.5,-3.9]) hole("keystone_solid");
	}
else if (1st_plate == "keystone1" && 1st_plate_bottom_hole != "outlet" && 1st_plate_bottom_hole != "toggle" && 1st_plate_bottom_hole != "rocker") {
	translate([height_sizes[plate_size]/2,l_offset[plate_size] - 11.5,-3.9]) hole("keystone_solid");
	}
if (1st_plate_bottom_hole == "keystone1" && 1st_plate == "none") {
	translate([height_sizes[plate_size]/2 + 14.3,l_offset[plate_size] - 11.5,-3.9]) hole("keystone_solid");
	}
else if (1st_plate_bottom_hole == "keystone1" && 1st_plate != "outlet" && 1st_plate != "toggle" && 1st_plate != "rocker") {
	translate([height_sizes[plate_size]/2 + 28.5,l_offset[plate_size] - 11.5,-3.9]) hole("keystone_solid");
	}

}

module plate2_solid(){
if (2nd_plate == "keystone1" && 2nd_plate_bottom_hole == "none") {
	translate([height_sizes[plate_size]/2 + 14.3,l_offset[plate_size] - 11.5 + switch_offset,-3.9]) hole("keystone_solid");
	}
else if (2nd_plate == "keystone1" && 2nd_plate_bottom_hole != "outlet" && 2nd_plate_bottom_hole != "toggle" && 2nd_plate_bottom_hole != "rocker") {
	translate([height_sizes[plate_size]/2,l_offset[plate_size] - 11.5 + switch_offset,-3.9]) hole("keystone_solid");
	}
if (2nd_plate_bottom_hole == "keystone1" && 2nd_plate == "none") {
	translate([height_sizes[plate_size]/2 + 14.3,l_offset[plate_size] - 11.5 + switch_offset,-3.9]) hole("keystone_solid");
	}
else if (2nd_plate_bottom_hole == "keystone1" && 2nd_plate != "outlet" && 2nd_plate != "toggle" && 2nd_plate != "rocker") {
	translate([height_sizes[plate_size]/2 + 28.5,l_offset[plate_size] - 11.5 + switch_offset,-3.9]) hole("keystone_solid");
	}

}

module plate3_solid(){
if (3rd_plate == "keystone1" && 3rd_plate_bottom_hole == "none") {
	translate([height_sizes[plate_size]/2 + 14.3,l_offset[plate_size] - 11.5 + switch_offset * 2,-3.9]) hole("keystone_solid");
	}
else if (3rd_plate == "keystone1" && 3rd_plate_bottom_hole != "outlet" && 3rd_plate_bottom_hole != "toggle" && 3rd_plate_bottom_hole != "rocker") {
	translate([height_sizes[plate_size]/2,l_offset[plate_size] - 11.5 + switch_offset * 2,-3.9]) hole("keystone_solid");
	}
if (3rd_plate_bottom_hole == "keystone1" && 3rd_plate == "none") {
	translate([height_sizes[plate_size]/2 + 14.3,l_offset[plate_size] - 11.5 + switch_offset * 2,-3.9]) hole("keystone_solid");
	}
else if (3rd_plate_bottom_hole == "keystone1" && 3rd_plate != "outlet" && 3rd_plate != "toggle" && 3rd_plate != "rocker") {
	translate([height_sizes[plate_size]/2 + 28.5,l_offset[plate_size] - 11.5 + switch_offset * 2,-3.9]) hole("keystone_solid");
	}

}

module plate4_solid(){
if (4th_plate == "keystone1" && 4th_plate_bottom_hole == "none") {
	translate([height_sizes[plate_size]/2 + 14.3,l_offset[plate_size] - 11.5 + switch_offset * 3,-3.9]) hole("keystone_solid");
	}
else if (4th_plate == "keystone1" && 4th_plate_bottom_hole != "outlet" && 4th_plate_bottom_hole != "toggle" && 4th_plate_bottom_hole != "rocker") {
	translate([height_sizes[plate_size]/2,l_offset[plate_size] - 11.5 + switch_offset * 3,-3.9]) hole("keystone_solid");
	}
if (4th_plate_bottom_hole == "keystone1" && 4th_plate == "none") {
	translate([height_sizes[plate_size]/2 + 14.3,l_offset[plate_size] - 11.5 + switch_offset * 3,-3.9]) hole("keystone_solid");
	}
else if (4th_plate_bottom_hole == "keystone1" && 4th_plate != "outlet" && 4th_plate != "toggle" && 4th_plate != "rocker") {
	translate([height_sizes[plate_size]/2 + 28.5,l_offset[plate_size] - 11.5 + switch_offset * 3,-3.9]) hole("keystone_solid");
	}

}

module plate5_solid(){
if (5th_plate == "keystone1" && 5th_plate_bottom_hole == "none") {
	translate([height_sizes[plate_size]/2 + 14.3,l_offset[plate_size] - 11.5 + switch_offset * 4,-3.9]) hole("keystone_solid");
	}
else if (5th_plate == "keystone1" && 5th_plate_bottom_hole != "outlet" && 5th_plate_bottom_hole != "toggle" && 5th_plate_bottom_hole != "rocker") {
	translate([height_sizes[plate_size]/2,l_offset[plate_size] - 11.5 + switch_offset * 4,-3.9]) hole("keystone_solid");
	}
if (5th_plate_bottom_hole == "keystone1" && 5th_plate == "none") {
	translate([height_sizes[plate_size]/2 + 14.3,l_offset[plate_size] - 11.5 + switch_offset * 4,-3.9]) hole("keystone_solid");
	}
else if (5th_plate_bottom_hole == "keystone1" && 5th_plate != "outlet" && 5th_plate != "toggle" && 5th_plate != "rocker") {
	translate([height_sizes[plate_size]/2 + 28.5,l_offset[plate_size] - 11.5 + switch_offset * 4,-3.9]) hole("keystone_solid");
	}

}

  ///////////////////
 // PlateStation: //
///////////////////

//Plate size and bevel
module plate() {
	difference() {
		cube([height_sizes[plate_size],solid_plate_width,6]);
		translate([-4.3,-5,6.2]) rotate([0,45,0]) cube([6,edgewidth,6]); //Top Bevel
		translate([height_sizes[plate_size]-4.2,-5,6.25]) rotate([0,45,0]) cube([6,edgewidth,6]); //Bottom Bevel
		translate([height_sizes[plate_size]+10,-4.4,6.1]) rotate([0,45,90]) cube([6,height_sizes[plate_size]+20,6]); //Left Bevel (doesn't change)
		translate([height_sizes[plate_size]+10,rightbevel,6]) rotate([0,45,90]) cube([6,height_sizes[plate_size]+10,6]); //Right Bevel (scales right)
				}
			}


// Thinning Plate
module plate_inner() {
	scale([0.95,thinner_offset[plate_width],1]){
	translate([3,3,0]){
	difference() {
		cube([height_sizes[plate_size],solid_plate_width,6]);
		translate([-4.3,-5,6.2]) rotate([0,45,0]) cube([6,edgewidth,6]); //Top Bevel
		translate([height_sizes[plate_size]-4.2,-5,6.25]) rotate([0,45,0]) cube([6,edgewidth,6]); //Bottom Bevel
		translate([height_sizes[plate_size]+10,-4.4,6.1]) rotate([0,45,90]) cube([6,height_sizes[plate_size]+20,6]); //Left Bevel (doesn't change)
		translate([height_sizes[plate_size]+10,rightbevel,6]) rotate([0,45,90]) cube([6,height_sizes[plate_size]+10,6]); //Right Bevel (scales right)
				}
			}
		}
	}

// Box screw holes
module box_screws(){
	 translate([height_sizes[plate_size]/2 + 41.67125,0,-1]) cylinder(r=2, h=10, $fn=12);
	 translate([height_sizes[plate_size]/2 + 41.67125,0,3.5]) cylinder(r1=2, r2=3.3, h=3);
	 translate([height_sizes[plate_size]/2 - 41.67125,0,-1]) cylinder(r=2, h=10, $fn=12);
	 translate([height_sizes[plate_size]/2 - 41.67125,0,3.5]) cylinder(r1=2, r2=3.3, h=3);
}

// Rocker/Designer screw holes
module rocker_screws(){
	 translate([height_sizes[plate_size]/2 + 48.41875,0,-1]) cylinder(r=2, h=10, $fn=12);
	 translate([height_sizes[plate_size]/2 + 48.41875,0,3.5]) cylinder(r1=2, r2=3.3, h=3);
	 translate([height_sizes[plate_size]/2 - 48.41875,0,-1]) cylinder(r=2, h=10, $fn=12);
	 translate([height_sizes[plate_size]/2 - 48.41875,0,3.5]) cylinder(r1=2, r2=3.3, h=3);
}

// Toggle screw holes
module toggle_screws(){
	 translate([height_sizes[plate_size]/2 + 30.1625,0,-1]) cylinder(r=2, h=10, $fn=12);
	 translate([height_sizes[plate_size]/2 + 30.1625,0,3.5]) cylinder(r1=2, r2=3.3, h=3);
	 translate([height_sizes[plate_size]/2 - 30.1625,0,-1]) cylinder(r=2, h=10, $fn=12);
	 translate([height_sizes[plate_size]/2 - 30.1625,0,3.5]) cylinder(r1=2, r2=3.3, h=3);
}

  ///////////////
 // Portland: //
///////////////

// Hole Cutout definitions
module hole(hole_type) {

	if (hole_type == "jmt22") {
		translate([0,0,5]) cube([16.5,15,10], center = true);
	}


// Toggle switch hole
	if (hole_type == "toggle") {
		translate([height_sizes[plate_size]/2,0,0]) cube([23.8125,10.3188,15], center = true);
		 						}

// Toggle switch hole and screw holes
	if (hole_type == "long_toggle") {
		translate([height_sizes[plate_size]/2,0,0]) cube([43.6563,11.9063,15], center = true);
		 						}

// Rocker switch plate
	if (hole_type == "rocker") {
		translate([height_sizes[plate_size]/2,0,0]) cube([67.1,33.3,15], center = true);

		 						}

// Duplex power outlet plate or dual side toggles
	if (hole_type == "outlet" || hole_type == "dualsidetoggle") {
		translate([height_sizes[plate_size]/2 + 19.3915,0,0]) {
			difference() {
				cylinder(r=17.4625, h=15, center = true);
				translate([-24.2875,-15,-2]) cube([10,37,15], center = false);
				translate([14.2875,-15,-2]) cube([10,37,15], center = false);
								}
							}
		translate([height_sizes[plate_size]/2 - 19.3915,0,0]){
			difference(){
				cylinder(r=17.4625, h=15, center = true);
				translate([-24.2875,-15,-2]) cube([10,37,15], center = false);
				translate([14.2875,-15,-2]) cube([10,37,15], center = false);
								}
							}
		translate([height_sizes[plate_size]/2,0,-1]) cylinder(r=2, h=10);
		translate([height_sizes[plate_size]/2,0,3.5]) cylinder(r1=2, r2=3.3, h=3);
							}

// Blank plate
	if (hole_type == "blank") { }

// VGA & DB09 plate
// VGA Fits http://www.datapro.net/products/vga-dual-panel-mount-f-f-cable.html
// DB09 Fits http://www.datapro.net/products/db9-serial-panel-mount-male-extension.html
	if (hole_type == "vga" || hole_type == "db09") {

			translate([0,-12.5,3]) cylinder(r=1.75, h=10, center = true);
			translate([0,12.5,3]) cylinder(r=1.75, h=10, center = true);
				difference(){
					cube([10,19,13], center=true);
					translate([-5,-9.2,1]) rotate([0,0,-35.6]) cube([4.4,2.4,15], center=true);
					translate([.9,-11.2,0]) rotate([0,0,9.6]) cube([10,4.8,15], center=true);
					translate([4.6,-8.5,0]) rotate([0,0,37.2]) cube([4.4,2.4,15], center=true);
					translate([-5,9.2,1]) rotate([0,0,35.6]) cube([4.4,2.4,15], center=true);
					translate([0.9,11.2,0]) rotate([0,0,-9.6]) cube([10,4.8,15], center=true);
					translate([4.6,8.5,0]) rotate([0,0,-37.2]) cube([4.4,2.4,15], center=true);
								}
						}

// HDMI plate
// Fits http://www.datapro.net/products/hdmi-panel-mount-extension-cable.html
	if (hole_type == "hdmi") {
		translate([0,-13,3]) cylinder(r=1.75, h=10, center = true);
		translate([0,13,3]) cylinder(r=1.75, h=10, center = true);
		translate([0,0,3]) cube([6,16,10], center=true);
							}

// DVI-I plate
// Fits http://www.datapro.net/products/dvi-i-panel-mount-extension-cable.html
	if (hole_type == "dvi") {
		translate([0,-16,3]) cylinder(r=1.75, h=10, center = true);
		translate([0,16,3]) cylinder(r=1.75, h=10, center = true);
		translate([0,0,3]) cube([10,26,10], center=true);
							}

// DisplayPort plate
// Fits http://www.datapro.net/products/dvi-i-panel-mount-extension-cable.html
	if (hole_type == "displayport") {
		translate([0,-13.5,3]) cylinder(r=1.75, h=10, center = true);
		translate([0,13.5,3]) cylinder(r=1.75, h=10, center = true);
		translate([0,0,0]){
			difference(){
				translate([0,0,3]) cube([7,19,10], center=true);
				translate([2.47,-9.37,3]) rotate([0,0,-54.6]) cube([3,5,14], center=true);
						}
								}
									}

// USB-A Plate
// Fits http://www.datapro.net/products/usb-panel-mount-type-a-cable.html
	if (hole_type == "usb-a") {
		translate([0,-15,3]) cylinder(r=1.75, h=10, center = true);
		translate([0,15,3]) cylinder(r=1.75, h=10, center = true);
		translate([0,0,3]) cube([8,16,10], center=true);
							}

// USB-B Plate
// Fits http://www.datapro.net/products/usb-panel-mount-type-b-cable.html
	if (hole_type == "usb-b") {
		translate([0,-13,3]) cylinder(r=1.75, h=10, center = true);
		translate([0,13,3]) cylinder(r=1.75, h=10, center = true);
		translate([0,0,3]) cube([11,12,10], center=true);
							}

// 1394 Firewire Plate
// Fits http://www.datapro.net/products/firewire-panel-mount-extension.html
	if (hole_type == "firewire") {
		translate([0,-13.5,3]) cylinder(r=1.75, h=10, center = true);
		translate([0,13.5,3]) cylinder(r=1.75, h=10, center = true);
		translate([0,0,3]) cube([7,12,10], center=true);
							}

// F-Type / Cable TV Plate
// Fits http://www.datapro.net/products/f-type-panel-mounting-coupler.html
	if (hole_type == "f-type") {
		translate([0,0,3]) cylinder(r=4.7625, h=10, center=true);
							}

// Cat5e & Gat6 plate
// Cat5e Fits http://www.datapro.net/products/cat-5e-panel-mount-ethernet.html
// Cat6 Fits hhttp://www.datapro.net/products/cat-6-panel-mount-ethernet.html
	if (hole_type == "cat5e" || hole_type == "cat6") {
		translate([0,-12.5,3]) cylinder(r=1.75, h=10, center = true);
		translate([0,12.5,3]) cylinder(r=1.75, h=10, center = true);
		translate([0,0,3]) cube([15,15,10], center=true);
		}

// S-Video & PS2 plate
// S-Video Fits hhttp://www.datapro.net/products/cat-6-panel-mount-ethernet.html
// PS2 http://www.datapro.net/products/ps2-panel-mount-extension-cable.html
	if (hole_type == "svideo" || hole_type == "ps2") {
		translate([0,-10,3]) cylinder(r=1.75, h=10, center = true);
		translate([0,10,3]) cylinder(r=1.75, h=10, center = true);
		translate([0,0,3]) cylinder(r=5, h=10, center=true);
		}


// Stereo / 1/4" headphone jack coupler
// Stereo coupler Fits http://www.datapro.net/products/stereo-panel-mount-coupler.html
	if (hole_type == "stereo") {
		translate([0,0,3]) cylinder(r=2.985, h=10, center=true);
		}

//Keystone1 hole
//Hole for 1 Keystone Jack
	if (hole_type == "keystone1") {
		translate([0,0,5]) cube([16.5,15,10], center = true);
	}

//Keystone Solid
	if (hole_type == "keystone_solid") {
		rotate([0,0,90]) {
			difference(){
				translate([0,0,.1]) cube([23,30.5,9.8]);
					translate([4,4,0]){
						difference(){
							cube([15,22.5,10]);
							translate([-1,-0.001,3.501]) cube([17,2,6.5]);
							translate([-1,2.5,-3.40970]) rotate([45,0,0]) cube([17,2,6.5]);
							translate([-1,18.501,6.001]) cube([17,4,4]);
							translate([-1,20.5,0]) rotate([-45,0,0]) cube([17,2,6.5]);
						}
					}
				}
			}
		}

//End of module "hole"
}

  ////////////////////////
 // Number One ENGAGE: //
////////////////////////

module plate_final(){
// Rotate so it sits correctly on plate (whoops) and make upside down
rotate([0,180,90]){
// put plate at 0,0,0 for easier printing
translate([-height_sizes[plate_size]/2,-solid_plate_width/2,-6]){

if (plate_width == 1) {
	difference() {
		plate();
		translate([0,0,-3]) plate_inner();
		plate1();
			}
		union() {
		plate1_solid();
		}
			}

else if (plate_width == 2) {
difference()
{
plate();
translate([0,0,-3]) plate_inner();
plate1();
plate2();
}
union() {
		plate1_solid();
		plate2_solid();
		}
}

else if (plate_width == 3) {
difference()
{
plate();
translate([0,0,-3]) plate_inner();
plate1();
plate2();
plate3();
}
union() {
		plate1_solid();
		plate2_solid();
		plate3_solid();
		}
}

else if (plate_width == 4) {
difference()
{
plate();
translate([0,0,-3]) plate_inner();
plate1();
plate2();
plate3();
plate4();
}
union() {
		plate1_solid();
		plate2_solid();
		plate3_solid();
		plate4_solid();
		}
}

else if (plate_width == 5) {
difference()
{
plate();
translate([0,0,-3]) plate_inner();
plate1();
plate2();
plate3();
plate4();
plate5();
}
union() {
		plate1_solid();
		plate2_solid();
		plate3_solid();
		plate4_solid();
		plate5_solid();
		}
}

//End Rotate
}
//End Translate
}
}

difference(){
	plate_final();
	cube([13,2,7],center=true);
	translate([0,4,0]) cube([13,2,7],center=true);
	translate([0,8,0]) cube([13,2,7],center=true);
	translate([0,-4,0]) cube([13,2,7],center=true);
	translate([0,-8,0]) cube([13,2,7],center=true);
}
translate([-18/2,-23/2,3]) DHT22_holder();
